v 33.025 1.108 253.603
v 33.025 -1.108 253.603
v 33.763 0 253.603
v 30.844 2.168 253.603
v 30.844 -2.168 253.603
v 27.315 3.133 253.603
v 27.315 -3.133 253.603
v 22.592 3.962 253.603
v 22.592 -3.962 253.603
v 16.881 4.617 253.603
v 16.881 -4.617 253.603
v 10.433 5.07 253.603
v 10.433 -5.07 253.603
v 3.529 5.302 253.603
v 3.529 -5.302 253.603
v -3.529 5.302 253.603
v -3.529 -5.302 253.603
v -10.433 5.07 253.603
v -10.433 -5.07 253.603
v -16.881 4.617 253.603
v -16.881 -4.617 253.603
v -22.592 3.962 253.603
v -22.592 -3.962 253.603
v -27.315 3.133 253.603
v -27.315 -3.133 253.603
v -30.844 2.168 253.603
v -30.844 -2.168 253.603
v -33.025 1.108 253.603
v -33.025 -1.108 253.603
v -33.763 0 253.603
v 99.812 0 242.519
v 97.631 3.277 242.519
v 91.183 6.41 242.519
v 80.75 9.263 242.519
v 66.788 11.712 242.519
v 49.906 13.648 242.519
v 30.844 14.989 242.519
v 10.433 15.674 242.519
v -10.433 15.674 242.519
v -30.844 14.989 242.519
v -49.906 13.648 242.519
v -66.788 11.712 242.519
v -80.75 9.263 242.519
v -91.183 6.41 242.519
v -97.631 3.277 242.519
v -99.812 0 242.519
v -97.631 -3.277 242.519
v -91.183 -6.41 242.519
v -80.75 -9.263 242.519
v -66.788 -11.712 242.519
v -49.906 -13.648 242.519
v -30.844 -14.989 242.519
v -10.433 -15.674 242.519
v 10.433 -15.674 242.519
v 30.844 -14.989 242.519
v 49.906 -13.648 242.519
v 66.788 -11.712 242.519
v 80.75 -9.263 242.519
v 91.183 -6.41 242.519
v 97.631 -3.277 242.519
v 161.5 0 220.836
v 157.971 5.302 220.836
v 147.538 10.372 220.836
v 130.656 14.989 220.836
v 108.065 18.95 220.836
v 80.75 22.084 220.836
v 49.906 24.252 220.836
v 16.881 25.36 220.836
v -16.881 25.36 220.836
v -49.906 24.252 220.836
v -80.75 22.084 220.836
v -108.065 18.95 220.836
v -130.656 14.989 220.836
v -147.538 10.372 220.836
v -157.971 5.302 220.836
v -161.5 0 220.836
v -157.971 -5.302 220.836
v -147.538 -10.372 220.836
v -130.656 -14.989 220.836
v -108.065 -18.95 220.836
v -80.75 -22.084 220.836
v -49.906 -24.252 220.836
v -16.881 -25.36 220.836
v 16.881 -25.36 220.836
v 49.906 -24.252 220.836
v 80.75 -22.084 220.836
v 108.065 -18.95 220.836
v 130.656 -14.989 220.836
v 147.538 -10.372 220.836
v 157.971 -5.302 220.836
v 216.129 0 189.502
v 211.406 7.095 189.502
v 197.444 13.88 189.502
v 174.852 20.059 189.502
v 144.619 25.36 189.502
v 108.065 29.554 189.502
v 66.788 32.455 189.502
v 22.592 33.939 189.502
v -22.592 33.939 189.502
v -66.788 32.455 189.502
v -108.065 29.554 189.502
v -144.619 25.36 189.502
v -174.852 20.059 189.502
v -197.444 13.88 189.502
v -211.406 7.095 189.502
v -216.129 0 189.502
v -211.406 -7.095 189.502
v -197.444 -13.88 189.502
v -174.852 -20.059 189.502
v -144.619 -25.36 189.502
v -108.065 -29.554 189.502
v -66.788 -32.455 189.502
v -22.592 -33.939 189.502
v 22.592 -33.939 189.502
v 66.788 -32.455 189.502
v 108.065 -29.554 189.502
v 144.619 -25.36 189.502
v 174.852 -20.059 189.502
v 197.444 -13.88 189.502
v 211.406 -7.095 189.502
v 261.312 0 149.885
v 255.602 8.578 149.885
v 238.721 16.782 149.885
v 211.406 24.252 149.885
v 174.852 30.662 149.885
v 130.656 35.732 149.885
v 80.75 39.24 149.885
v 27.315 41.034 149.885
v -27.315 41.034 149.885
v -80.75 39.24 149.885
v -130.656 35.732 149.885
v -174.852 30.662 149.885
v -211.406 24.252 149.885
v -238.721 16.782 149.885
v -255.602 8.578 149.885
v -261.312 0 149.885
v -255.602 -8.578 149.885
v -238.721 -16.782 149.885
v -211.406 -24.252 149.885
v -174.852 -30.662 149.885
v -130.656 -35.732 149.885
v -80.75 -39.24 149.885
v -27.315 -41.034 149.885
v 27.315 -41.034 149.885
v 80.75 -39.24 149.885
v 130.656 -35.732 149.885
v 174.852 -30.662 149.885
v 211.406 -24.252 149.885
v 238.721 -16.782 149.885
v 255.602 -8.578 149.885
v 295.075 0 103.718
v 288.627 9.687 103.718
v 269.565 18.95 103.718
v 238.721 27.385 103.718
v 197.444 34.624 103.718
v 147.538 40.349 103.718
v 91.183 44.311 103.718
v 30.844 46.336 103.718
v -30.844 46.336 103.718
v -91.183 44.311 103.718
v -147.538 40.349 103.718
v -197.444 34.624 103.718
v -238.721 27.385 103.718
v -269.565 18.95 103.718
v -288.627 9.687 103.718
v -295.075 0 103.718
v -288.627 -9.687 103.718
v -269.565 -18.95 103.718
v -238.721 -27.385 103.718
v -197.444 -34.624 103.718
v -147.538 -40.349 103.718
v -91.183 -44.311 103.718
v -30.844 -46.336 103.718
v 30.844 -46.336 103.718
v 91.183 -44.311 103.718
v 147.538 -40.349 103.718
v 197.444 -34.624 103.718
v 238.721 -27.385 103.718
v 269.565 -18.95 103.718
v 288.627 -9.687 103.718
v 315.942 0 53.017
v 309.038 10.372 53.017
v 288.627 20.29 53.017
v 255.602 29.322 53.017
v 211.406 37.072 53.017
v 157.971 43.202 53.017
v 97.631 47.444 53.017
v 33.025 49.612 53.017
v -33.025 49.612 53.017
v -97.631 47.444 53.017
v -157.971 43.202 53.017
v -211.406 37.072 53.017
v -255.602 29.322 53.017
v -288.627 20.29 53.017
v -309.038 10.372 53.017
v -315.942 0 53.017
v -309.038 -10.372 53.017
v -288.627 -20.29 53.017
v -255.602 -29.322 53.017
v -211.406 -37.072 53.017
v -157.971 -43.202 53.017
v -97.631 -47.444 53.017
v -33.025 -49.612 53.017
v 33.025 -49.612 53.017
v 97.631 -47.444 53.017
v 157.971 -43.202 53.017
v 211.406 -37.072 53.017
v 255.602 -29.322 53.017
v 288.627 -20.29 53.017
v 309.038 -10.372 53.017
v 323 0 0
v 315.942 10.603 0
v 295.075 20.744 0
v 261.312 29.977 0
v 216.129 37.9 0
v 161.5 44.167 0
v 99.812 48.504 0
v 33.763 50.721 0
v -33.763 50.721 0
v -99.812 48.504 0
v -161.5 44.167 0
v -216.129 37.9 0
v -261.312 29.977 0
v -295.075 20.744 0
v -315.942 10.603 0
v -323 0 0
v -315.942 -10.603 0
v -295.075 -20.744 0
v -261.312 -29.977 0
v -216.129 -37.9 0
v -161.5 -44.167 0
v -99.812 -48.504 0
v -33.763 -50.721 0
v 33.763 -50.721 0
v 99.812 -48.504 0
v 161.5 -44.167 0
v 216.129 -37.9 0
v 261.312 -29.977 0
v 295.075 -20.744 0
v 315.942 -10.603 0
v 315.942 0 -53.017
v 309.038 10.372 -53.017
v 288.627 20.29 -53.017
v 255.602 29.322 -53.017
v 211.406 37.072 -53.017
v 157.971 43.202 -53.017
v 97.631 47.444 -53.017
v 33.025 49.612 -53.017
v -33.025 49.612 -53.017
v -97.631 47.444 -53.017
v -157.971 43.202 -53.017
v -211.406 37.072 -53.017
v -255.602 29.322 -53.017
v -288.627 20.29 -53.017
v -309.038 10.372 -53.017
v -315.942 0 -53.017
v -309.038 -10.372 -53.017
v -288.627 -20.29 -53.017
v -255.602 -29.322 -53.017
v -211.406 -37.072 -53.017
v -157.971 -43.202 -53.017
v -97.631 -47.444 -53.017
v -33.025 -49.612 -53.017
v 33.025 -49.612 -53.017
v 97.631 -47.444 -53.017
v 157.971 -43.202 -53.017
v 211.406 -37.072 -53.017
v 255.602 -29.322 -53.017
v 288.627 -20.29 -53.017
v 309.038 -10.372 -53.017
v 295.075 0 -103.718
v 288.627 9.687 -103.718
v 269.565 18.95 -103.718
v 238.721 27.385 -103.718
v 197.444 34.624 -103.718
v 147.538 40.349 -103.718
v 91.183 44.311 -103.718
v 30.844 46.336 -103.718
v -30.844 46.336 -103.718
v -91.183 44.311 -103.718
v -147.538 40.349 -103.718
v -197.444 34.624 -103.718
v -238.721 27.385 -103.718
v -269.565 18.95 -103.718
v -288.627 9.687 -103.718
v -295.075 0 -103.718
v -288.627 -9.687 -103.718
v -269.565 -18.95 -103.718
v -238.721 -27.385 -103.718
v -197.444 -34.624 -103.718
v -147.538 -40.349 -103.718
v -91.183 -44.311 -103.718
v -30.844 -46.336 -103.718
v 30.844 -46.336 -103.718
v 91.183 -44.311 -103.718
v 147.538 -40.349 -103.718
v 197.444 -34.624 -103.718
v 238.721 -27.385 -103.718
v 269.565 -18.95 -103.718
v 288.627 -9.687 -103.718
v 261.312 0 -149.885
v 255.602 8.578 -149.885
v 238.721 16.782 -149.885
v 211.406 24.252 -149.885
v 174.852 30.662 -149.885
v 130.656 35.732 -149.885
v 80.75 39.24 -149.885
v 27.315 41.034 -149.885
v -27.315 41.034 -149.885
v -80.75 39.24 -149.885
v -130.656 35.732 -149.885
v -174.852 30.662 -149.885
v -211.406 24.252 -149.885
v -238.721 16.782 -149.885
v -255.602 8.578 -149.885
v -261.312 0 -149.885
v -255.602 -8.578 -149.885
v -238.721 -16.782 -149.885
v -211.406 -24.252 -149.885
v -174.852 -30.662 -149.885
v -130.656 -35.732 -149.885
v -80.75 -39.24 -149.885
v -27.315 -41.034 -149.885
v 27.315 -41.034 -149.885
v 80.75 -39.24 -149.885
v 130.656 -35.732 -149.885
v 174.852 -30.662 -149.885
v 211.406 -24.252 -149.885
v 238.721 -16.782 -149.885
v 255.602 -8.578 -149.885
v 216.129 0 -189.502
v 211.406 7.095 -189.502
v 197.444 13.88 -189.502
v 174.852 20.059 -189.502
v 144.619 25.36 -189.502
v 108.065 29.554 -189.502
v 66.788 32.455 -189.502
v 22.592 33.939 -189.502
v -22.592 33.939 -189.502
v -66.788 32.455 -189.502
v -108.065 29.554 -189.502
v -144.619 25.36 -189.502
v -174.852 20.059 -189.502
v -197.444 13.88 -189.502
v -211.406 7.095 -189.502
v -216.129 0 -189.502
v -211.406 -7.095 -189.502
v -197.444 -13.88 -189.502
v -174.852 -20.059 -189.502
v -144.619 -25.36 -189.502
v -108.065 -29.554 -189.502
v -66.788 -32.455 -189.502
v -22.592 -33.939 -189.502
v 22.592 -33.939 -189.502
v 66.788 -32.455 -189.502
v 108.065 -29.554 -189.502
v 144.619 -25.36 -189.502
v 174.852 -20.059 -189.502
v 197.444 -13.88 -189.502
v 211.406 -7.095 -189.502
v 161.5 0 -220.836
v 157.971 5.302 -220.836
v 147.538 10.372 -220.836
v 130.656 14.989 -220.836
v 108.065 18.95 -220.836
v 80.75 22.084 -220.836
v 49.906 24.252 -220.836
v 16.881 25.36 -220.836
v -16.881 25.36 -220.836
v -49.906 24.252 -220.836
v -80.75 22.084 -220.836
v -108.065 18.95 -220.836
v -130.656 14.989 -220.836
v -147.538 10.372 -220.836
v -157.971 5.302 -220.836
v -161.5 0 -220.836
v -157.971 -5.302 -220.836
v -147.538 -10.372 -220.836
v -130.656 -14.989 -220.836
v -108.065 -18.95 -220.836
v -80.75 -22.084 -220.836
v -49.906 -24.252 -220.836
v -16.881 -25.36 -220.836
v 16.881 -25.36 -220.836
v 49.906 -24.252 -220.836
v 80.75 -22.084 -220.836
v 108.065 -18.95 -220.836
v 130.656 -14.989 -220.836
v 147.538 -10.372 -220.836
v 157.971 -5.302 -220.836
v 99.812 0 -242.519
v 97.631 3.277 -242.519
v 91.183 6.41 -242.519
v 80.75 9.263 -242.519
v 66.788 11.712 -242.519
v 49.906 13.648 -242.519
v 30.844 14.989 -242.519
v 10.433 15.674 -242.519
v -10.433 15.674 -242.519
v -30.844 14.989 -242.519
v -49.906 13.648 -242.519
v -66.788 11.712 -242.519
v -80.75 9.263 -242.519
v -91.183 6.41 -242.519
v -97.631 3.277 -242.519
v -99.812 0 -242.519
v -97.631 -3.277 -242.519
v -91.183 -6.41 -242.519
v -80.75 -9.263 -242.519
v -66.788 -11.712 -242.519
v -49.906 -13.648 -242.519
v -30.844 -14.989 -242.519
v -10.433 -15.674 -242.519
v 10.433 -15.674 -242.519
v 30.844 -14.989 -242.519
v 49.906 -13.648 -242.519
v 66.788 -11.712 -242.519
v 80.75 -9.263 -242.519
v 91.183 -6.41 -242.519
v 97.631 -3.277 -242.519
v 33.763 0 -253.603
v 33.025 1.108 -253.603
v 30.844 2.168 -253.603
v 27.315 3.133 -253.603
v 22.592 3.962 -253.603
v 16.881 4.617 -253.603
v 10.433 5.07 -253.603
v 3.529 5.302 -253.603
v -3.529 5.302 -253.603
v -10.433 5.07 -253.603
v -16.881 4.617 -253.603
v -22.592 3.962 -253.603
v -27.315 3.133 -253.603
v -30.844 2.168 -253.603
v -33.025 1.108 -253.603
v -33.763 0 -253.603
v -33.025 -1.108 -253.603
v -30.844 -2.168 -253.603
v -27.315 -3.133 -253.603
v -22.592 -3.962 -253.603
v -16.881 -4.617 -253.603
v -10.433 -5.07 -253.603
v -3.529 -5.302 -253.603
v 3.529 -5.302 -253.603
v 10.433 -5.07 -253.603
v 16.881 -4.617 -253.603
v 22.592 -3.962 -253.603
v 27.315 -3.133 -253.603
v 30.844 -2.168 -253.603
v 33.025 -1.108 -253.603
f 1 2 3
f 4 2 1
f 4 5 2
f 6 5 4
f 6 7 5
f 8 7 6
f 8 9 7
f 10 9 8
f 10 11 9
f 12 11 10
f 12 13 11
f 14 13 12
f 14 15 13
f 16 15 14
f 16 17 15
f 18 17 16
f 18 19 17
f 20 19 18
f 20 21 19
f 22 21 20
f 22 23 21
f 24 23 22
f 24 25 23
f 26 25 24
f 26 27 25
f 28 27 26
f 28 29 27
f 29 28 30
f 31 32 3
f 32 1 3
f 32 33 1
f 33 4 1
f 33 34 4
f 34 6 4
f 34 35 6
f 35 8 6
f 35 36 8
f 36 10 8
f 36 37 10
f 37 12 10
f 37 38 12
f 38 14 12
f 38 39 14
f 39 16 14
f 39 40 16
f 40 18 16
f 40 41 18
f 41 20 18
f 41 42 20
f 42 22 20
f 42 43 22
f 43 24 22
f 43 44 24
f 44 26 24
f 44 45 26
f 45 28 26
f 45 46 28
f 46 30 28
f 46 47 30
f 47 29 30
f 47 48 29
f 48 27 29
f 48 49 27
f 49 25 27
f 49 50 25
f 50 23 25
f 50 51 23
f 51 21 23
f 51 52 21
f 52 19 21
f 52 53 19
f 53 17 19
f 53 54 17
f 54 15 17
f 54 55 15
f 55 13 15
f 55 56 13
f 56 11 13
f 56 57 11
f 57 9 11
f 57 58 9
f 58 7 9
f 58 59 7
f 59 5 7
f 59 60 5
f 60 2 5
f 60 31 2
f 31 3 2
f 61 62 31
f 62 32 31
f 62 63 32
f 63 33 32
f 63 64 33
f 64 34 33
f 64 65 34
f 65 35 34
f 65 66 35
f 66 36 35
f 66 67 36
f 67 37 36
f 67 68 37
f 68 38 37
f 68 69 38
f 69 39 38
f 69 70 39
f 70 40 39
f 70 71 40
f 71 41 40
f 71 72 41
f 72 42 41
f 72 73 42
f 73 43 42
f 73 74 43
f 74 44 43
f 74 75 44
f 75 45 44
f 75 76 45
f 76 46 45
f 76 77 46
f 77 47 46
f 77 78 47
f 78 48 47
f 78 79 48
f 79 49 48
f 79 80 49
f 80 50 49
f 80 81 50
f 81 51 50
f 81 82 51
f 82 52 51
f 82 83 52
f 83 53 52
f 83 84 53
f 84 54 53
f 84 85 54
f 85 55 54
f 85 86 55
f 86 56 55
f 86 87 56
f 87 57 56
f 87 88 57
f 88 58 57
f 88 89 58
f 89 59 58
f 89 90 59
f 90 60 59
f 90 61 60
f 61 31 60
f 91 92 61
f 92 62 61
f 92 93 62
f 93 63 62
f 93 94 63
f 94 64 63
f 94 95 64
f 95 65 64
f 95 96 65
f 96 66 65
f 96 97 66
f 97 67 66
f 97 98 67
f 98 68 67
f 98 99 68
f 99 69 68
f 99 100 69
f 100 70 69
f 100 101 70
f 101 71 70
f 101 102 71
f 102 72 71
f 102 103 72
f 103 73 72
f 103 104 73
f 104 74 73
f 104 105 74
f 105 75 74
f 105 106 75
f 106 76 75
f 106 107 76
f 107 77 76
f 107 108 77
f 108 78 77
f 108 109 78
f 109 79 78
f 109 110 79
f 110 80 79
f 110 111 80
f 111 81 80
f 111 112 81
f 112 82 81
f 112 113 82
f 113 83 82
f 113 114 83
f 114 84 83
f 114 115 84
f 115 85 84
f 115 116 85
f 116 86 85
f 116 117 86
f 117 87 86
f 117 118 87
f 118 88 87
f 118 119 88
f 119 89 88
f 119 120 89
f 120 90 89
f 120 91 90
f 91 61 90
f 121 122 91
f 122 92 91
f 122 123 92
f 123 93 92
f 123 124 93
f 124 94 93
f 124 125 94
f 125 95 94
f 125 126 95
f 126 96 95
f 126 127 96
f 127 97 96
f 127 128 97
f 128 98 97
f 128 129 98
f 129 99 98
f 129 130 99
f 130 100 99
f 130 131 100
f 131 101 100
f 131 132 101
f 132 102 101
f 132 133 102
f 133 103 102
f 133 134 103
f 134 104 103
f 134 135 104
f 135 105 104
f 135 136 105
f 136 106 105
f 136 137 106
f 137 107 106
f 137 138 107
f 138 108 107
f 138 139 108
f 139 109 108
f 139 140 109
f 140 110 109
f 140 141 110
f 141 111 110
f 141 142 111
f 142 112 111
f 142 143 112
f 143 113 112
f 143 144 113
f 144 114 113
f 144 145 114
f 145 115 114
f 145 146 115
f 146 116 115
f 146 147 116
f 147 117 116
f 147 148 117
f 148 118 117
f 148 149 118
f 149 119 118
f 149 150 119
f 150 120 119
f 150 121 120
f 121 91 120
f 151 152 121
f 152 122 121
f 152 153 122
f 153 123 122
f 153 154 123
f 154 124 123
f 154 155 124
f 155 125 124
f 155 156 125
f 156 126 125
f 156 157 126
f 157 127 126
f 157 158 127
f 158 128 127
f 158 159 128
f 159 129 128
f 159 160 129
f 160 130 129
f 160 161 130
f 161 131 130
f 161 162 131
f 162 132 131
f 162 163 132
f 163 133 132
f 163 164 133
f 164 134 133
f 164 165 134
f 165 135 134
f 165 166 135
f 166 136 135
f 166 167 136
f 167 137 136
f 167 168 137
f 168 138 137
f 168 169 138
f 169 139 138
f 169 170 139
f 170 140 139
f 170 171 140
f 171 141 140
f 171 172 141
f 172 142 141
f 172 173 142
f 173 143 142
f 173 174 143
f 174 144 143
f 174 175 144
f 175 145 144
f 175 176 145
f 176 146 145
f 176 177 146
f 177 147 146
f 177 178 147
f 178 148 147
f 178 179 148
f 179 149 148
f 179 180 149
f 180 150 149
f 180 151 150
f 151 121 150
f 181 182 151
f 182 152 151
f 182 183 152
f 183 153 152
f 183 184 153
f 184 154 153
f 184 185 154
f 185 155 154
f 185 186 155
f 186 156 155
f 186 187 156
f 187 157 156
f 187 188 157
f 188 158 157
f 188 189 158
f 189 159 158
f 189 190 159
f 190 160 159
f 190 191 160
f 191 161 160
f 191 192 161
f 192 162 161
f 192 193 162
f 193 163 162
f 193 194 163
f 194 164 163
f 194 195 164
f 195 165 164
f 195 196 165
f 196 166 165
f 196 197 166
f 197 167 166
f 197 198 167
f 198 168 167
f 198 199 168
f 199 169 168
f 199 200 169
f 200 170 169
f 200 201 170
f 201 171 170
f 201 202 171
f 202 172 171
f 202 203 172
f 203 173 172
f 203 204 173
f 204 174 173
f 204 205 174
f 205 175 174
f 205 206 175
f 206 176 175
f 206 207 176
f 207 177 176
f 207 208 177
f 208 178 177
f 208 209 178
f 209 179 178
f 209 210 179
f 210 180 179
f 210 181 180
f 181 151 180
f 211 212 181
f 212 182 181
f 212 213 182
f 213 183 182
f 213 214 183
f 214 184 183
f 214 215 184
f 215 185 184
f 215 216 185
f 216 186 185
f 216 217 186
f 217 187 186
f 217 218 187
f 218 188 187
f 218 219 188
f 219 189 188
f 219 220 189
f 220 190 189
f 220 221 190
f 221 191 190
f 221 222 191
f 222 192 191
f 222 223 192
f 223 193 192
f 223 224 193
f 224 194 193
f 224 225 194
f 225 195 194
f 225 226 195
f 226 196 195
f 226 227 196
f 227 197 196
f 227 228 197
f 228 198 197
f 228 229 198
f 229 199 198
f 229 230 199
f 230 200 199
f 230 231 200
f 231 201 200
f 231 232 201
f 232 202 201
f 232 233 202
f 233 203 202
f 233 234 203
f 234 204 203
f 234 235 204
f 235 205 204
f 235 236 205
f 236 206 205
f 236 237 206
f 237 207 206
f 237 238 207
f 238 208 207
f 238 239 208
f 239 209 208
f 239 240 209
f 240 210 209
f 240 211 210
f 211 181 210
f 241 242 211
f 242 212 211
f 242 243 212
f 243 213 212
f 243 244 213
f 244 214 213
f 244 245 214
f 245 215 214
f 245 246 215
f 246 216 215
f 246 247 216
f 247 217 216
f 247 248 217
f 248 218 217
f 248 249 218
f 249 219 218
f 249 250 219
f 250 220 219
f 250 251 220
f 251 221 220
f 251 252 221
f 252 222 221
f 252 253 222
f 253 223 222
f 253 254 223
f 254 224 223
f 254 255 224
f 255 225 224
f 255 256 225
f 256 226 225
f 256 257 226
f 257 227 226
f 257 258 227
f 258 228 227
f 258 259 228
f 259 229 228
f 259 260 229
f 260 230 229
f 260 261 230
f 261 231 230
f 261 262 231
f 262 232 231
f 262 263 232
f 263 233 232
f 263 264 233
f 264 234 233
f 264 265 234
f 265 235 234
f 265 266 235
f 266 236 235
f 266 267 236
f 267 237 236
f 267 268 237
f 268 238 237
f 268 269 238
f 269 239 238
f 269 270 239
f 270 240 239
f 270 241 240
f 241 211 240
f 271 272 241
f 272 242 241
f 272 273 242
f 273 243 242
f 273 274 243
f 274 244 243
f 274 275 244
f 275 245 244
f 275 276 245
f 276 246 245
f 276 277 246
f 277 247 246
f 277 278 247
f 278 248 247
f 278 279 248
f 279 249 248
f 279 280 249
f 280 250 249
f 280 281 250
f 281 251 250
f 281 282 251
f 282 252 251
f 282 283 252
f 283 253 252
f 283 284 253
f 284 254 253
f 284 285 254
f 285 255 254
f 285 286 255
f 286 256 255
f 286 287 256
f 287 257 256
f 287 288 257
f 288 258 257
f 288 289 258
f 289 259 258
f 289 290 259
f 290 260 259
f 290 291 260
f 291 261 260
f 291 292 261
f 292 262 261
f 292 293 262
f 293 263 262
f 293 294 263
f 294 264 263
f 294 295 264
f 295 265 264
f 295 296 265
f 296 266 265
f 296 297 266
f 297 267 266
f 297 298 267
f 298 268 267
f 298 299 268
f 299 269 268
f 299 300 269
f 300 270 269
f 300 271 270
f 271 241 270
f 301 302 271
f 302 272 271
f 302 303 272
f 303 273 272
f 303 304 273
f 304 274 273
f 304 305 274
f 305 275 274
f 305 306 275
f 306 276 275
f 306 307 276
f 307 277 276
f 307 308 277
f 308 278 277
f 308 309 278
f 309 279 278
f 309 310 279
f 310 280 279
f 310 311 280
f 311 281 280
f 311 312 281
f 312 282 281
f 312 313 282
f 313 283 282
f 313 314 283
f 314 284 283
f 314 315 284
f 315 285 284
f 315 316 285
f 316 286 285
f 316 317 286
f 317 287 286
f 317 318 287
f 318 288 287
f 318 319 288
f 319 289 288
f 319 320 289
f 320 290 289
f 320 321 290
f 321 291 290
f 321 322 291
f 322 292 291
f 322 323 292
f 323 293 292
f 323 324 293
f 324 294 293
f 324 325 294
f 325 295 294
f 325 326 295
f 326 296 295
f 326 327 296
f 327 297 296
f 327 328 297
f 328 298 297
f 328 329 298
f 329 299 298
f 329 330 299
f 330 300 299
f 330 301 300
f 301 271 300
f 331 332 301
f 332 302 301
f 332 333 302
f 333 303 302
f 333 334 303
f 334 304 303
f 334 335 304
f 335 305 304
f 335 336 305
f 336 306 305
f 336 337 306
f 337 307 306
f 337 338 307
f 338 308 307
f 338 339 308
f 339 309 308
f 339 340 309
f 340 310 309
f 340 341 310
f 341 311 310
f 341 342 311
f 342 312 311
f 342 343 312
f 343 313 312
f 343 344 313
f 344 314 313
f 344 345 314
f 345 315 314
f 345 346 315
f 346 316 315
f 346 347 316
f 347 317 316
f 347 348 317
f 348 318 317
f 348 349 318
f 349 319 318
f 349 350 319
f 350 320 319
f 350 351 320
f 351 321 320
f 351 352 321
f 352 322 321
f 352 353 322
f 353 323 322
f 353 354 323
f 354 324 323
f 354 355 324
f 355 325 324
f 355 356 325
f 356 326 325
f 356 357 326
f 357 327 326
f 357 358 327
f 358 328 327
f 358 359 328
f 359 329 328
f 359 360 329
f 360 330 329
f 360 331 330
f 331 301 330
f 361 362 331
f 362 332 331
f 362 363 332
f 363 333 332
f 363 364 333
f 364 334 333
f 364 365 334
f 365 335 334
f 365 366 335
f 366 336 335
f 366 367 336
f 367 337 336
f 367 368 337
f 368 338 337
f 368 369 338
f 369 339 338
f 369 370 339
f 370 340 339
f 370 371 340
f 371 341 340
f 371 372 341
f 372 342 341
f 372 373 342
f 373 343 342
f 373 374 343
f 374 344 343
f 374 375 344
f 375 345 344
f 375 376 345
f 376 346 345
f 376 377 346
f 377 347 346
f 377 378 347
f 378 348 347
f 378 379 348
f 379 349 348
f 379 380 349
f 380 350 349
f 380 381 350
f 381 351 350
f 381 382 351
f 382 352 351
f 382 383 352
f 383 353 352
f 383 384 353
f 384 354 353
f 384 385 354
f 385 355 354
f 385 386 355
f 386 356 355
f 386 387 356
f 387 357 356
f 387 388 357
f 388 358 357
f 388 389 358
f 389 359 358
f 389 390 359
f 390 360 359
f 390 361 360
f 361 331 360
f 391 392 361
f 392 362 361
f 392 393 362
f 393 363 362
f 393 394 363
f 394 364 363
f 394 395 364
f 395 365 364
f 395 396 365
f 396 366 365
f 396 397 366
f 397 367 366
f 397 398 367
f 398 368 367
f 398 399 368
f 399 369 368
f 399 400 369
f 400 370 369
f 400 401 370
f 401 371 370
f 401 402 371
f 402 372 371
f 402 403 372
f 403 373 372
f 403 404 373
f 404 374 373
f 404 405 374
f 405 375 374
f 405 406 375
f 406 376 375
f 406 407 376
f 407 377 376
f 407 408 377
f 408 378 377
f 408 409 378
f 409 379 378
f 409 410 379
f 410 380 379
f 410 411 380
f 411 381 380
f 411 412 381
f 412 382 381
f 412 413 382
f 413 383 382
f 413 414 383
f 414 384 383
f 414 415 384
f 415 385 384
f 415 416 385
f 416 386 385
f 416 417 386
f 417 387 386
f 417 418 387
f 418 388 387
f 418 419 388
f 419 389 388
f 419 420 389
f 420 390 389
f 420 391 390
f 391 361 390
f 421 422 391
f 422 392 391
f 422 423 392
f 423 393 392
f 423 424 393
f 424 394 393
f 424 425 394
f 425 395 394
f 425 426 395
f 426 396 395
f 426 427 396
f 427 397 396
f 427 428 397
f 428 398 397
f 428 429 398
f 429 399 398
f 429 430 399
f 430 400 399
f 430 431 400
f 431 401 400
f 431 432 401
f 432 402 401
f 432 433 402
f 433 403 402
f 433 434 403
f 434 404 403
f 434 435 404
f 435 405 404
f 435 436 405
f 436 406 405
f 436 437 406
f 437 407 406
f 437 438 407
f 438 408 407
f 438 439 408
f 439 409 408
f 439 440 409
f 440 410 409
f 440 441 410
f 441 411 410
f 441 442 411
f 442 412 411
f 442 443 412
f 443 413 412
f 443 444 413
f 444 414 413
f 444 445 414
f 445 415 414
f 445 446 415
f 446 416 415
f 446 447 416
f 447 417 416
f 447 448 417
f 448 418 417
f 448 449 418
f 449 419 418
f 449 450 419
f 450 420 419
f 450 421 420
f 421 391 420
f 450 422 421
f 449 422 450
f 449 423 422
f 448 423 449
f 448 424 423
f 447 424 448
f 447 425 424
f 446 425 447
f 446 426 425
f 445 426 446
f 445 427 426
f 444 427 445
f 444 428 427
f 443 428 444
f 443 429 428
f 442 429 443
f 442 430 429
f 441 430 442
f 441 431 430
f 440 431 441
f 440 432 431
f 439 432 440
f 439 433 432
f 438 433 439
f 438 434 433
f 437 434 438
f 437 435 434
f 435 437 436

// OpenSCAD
// Generated by SolidPython 1.0.1 on 2020-07-29 00:46:53


scale(v = [19, 3, 15]) {
	sphere(r = 17);
}
/***********************************************
*********      SolidPython code:      **********
************************************************
 
# import packages: SolidPython
from solid import *
from solid.utils import *
from itertools import chain, combinations, permutations


class Resize:

    def __init__(self, scad_file):
        self.scad_file = scad_file
        #self.scad_file = import_scad(scad_file)
        # cone/cylinder param:
        self.r1 = 0
        self.r2 = 0
        self.h = 0
        # rectangular prism param:
        self.w = 0
        self.l = 0
        # ellipse param:
        self.r = 0

    # import OpenScad code (file name corresponds to shape)


    # classify shape + parameters
    def assign(self, param1, param2, param3):
        if self.scad_file == 'cone.scad':
            self.r1 = param1
            self.r2 = param2
            self.h = param3
        elif self.scad_file == 'cylinder.scad':
            self.r1 = param1
            self.r2 = param2
            self.h = param3
        elif self.scad_file == 'rectangularPrism.scad':
            self.h = param1
            self.l = param2
            self.w = param3
        else:
            self.r = param1
            self.h = param2

    # resize parameters
    def iterate(self):
        x = range(3, 20, 2)
        i = 1
        if self.scad_file == 'cone.scad':
            tempList = list(permutations(x, 2))
            for temp in tempList:
                param1 = temp[0]
                param2 = temp[1]
                filepath = 'produced_scad_files/' + 'cone' + str(param1) + '_' + str(param2) + '_' + '.scad'
                scad_render_to_file(cylinder(h=param1, r1=param2, r2=0), filepath)

        elif self.scad_file == 'cylinder.scad':
            tempList = list(permutations(x, 3))
            for temp in tempList:
                param1 = temp[0]
                param2 = temp[1]
                filepath = 'produced_scad_files/' + 'cylinder' + str(param1) + '_' + str(param2) + '_' + '.scad'
                scad_render_to_file(cylinder(h=param1, r1=param2, r2=param2), filepath)

        elif self.scad_file == 'rectangularPrism.scad':
            tempList = list(permutations(x, 3))
            for temp in tempList:
                param1 = temp[0]
                param2 = temp[1]
                param3 = temp[2]
                filepath = 'produced_scad_files/' + 'rectangularPrism' + str(param1) + '_' + str(param2) + '_' + str(
                    param3) + '.scad'
                scad_render_to_file(cube(size=(param1, param2, param3)), filepath)

        elif self.scad_file == 'ellipse.scad':
            tempList = list(permutations(x, 4))
            for temp in tempList:
                param1 = temp[0]
                param2 = temp[1]
                param3 = temp[2]
                param4 = temp[3]
                filepath = 'produced_scad_files/' + 'ellipse' + str(param1) + '_' + str(param2) + '_' + str(param3) + '_' + str(param4) + '.scad'
                scad_render_to_file(scale([param1, param2, param3])(sphere(r=param4)), filepath)

    def render_to_scadfile(self):
        scad_render_to_file(scad, 'example.scad') 
 
************************************************/
